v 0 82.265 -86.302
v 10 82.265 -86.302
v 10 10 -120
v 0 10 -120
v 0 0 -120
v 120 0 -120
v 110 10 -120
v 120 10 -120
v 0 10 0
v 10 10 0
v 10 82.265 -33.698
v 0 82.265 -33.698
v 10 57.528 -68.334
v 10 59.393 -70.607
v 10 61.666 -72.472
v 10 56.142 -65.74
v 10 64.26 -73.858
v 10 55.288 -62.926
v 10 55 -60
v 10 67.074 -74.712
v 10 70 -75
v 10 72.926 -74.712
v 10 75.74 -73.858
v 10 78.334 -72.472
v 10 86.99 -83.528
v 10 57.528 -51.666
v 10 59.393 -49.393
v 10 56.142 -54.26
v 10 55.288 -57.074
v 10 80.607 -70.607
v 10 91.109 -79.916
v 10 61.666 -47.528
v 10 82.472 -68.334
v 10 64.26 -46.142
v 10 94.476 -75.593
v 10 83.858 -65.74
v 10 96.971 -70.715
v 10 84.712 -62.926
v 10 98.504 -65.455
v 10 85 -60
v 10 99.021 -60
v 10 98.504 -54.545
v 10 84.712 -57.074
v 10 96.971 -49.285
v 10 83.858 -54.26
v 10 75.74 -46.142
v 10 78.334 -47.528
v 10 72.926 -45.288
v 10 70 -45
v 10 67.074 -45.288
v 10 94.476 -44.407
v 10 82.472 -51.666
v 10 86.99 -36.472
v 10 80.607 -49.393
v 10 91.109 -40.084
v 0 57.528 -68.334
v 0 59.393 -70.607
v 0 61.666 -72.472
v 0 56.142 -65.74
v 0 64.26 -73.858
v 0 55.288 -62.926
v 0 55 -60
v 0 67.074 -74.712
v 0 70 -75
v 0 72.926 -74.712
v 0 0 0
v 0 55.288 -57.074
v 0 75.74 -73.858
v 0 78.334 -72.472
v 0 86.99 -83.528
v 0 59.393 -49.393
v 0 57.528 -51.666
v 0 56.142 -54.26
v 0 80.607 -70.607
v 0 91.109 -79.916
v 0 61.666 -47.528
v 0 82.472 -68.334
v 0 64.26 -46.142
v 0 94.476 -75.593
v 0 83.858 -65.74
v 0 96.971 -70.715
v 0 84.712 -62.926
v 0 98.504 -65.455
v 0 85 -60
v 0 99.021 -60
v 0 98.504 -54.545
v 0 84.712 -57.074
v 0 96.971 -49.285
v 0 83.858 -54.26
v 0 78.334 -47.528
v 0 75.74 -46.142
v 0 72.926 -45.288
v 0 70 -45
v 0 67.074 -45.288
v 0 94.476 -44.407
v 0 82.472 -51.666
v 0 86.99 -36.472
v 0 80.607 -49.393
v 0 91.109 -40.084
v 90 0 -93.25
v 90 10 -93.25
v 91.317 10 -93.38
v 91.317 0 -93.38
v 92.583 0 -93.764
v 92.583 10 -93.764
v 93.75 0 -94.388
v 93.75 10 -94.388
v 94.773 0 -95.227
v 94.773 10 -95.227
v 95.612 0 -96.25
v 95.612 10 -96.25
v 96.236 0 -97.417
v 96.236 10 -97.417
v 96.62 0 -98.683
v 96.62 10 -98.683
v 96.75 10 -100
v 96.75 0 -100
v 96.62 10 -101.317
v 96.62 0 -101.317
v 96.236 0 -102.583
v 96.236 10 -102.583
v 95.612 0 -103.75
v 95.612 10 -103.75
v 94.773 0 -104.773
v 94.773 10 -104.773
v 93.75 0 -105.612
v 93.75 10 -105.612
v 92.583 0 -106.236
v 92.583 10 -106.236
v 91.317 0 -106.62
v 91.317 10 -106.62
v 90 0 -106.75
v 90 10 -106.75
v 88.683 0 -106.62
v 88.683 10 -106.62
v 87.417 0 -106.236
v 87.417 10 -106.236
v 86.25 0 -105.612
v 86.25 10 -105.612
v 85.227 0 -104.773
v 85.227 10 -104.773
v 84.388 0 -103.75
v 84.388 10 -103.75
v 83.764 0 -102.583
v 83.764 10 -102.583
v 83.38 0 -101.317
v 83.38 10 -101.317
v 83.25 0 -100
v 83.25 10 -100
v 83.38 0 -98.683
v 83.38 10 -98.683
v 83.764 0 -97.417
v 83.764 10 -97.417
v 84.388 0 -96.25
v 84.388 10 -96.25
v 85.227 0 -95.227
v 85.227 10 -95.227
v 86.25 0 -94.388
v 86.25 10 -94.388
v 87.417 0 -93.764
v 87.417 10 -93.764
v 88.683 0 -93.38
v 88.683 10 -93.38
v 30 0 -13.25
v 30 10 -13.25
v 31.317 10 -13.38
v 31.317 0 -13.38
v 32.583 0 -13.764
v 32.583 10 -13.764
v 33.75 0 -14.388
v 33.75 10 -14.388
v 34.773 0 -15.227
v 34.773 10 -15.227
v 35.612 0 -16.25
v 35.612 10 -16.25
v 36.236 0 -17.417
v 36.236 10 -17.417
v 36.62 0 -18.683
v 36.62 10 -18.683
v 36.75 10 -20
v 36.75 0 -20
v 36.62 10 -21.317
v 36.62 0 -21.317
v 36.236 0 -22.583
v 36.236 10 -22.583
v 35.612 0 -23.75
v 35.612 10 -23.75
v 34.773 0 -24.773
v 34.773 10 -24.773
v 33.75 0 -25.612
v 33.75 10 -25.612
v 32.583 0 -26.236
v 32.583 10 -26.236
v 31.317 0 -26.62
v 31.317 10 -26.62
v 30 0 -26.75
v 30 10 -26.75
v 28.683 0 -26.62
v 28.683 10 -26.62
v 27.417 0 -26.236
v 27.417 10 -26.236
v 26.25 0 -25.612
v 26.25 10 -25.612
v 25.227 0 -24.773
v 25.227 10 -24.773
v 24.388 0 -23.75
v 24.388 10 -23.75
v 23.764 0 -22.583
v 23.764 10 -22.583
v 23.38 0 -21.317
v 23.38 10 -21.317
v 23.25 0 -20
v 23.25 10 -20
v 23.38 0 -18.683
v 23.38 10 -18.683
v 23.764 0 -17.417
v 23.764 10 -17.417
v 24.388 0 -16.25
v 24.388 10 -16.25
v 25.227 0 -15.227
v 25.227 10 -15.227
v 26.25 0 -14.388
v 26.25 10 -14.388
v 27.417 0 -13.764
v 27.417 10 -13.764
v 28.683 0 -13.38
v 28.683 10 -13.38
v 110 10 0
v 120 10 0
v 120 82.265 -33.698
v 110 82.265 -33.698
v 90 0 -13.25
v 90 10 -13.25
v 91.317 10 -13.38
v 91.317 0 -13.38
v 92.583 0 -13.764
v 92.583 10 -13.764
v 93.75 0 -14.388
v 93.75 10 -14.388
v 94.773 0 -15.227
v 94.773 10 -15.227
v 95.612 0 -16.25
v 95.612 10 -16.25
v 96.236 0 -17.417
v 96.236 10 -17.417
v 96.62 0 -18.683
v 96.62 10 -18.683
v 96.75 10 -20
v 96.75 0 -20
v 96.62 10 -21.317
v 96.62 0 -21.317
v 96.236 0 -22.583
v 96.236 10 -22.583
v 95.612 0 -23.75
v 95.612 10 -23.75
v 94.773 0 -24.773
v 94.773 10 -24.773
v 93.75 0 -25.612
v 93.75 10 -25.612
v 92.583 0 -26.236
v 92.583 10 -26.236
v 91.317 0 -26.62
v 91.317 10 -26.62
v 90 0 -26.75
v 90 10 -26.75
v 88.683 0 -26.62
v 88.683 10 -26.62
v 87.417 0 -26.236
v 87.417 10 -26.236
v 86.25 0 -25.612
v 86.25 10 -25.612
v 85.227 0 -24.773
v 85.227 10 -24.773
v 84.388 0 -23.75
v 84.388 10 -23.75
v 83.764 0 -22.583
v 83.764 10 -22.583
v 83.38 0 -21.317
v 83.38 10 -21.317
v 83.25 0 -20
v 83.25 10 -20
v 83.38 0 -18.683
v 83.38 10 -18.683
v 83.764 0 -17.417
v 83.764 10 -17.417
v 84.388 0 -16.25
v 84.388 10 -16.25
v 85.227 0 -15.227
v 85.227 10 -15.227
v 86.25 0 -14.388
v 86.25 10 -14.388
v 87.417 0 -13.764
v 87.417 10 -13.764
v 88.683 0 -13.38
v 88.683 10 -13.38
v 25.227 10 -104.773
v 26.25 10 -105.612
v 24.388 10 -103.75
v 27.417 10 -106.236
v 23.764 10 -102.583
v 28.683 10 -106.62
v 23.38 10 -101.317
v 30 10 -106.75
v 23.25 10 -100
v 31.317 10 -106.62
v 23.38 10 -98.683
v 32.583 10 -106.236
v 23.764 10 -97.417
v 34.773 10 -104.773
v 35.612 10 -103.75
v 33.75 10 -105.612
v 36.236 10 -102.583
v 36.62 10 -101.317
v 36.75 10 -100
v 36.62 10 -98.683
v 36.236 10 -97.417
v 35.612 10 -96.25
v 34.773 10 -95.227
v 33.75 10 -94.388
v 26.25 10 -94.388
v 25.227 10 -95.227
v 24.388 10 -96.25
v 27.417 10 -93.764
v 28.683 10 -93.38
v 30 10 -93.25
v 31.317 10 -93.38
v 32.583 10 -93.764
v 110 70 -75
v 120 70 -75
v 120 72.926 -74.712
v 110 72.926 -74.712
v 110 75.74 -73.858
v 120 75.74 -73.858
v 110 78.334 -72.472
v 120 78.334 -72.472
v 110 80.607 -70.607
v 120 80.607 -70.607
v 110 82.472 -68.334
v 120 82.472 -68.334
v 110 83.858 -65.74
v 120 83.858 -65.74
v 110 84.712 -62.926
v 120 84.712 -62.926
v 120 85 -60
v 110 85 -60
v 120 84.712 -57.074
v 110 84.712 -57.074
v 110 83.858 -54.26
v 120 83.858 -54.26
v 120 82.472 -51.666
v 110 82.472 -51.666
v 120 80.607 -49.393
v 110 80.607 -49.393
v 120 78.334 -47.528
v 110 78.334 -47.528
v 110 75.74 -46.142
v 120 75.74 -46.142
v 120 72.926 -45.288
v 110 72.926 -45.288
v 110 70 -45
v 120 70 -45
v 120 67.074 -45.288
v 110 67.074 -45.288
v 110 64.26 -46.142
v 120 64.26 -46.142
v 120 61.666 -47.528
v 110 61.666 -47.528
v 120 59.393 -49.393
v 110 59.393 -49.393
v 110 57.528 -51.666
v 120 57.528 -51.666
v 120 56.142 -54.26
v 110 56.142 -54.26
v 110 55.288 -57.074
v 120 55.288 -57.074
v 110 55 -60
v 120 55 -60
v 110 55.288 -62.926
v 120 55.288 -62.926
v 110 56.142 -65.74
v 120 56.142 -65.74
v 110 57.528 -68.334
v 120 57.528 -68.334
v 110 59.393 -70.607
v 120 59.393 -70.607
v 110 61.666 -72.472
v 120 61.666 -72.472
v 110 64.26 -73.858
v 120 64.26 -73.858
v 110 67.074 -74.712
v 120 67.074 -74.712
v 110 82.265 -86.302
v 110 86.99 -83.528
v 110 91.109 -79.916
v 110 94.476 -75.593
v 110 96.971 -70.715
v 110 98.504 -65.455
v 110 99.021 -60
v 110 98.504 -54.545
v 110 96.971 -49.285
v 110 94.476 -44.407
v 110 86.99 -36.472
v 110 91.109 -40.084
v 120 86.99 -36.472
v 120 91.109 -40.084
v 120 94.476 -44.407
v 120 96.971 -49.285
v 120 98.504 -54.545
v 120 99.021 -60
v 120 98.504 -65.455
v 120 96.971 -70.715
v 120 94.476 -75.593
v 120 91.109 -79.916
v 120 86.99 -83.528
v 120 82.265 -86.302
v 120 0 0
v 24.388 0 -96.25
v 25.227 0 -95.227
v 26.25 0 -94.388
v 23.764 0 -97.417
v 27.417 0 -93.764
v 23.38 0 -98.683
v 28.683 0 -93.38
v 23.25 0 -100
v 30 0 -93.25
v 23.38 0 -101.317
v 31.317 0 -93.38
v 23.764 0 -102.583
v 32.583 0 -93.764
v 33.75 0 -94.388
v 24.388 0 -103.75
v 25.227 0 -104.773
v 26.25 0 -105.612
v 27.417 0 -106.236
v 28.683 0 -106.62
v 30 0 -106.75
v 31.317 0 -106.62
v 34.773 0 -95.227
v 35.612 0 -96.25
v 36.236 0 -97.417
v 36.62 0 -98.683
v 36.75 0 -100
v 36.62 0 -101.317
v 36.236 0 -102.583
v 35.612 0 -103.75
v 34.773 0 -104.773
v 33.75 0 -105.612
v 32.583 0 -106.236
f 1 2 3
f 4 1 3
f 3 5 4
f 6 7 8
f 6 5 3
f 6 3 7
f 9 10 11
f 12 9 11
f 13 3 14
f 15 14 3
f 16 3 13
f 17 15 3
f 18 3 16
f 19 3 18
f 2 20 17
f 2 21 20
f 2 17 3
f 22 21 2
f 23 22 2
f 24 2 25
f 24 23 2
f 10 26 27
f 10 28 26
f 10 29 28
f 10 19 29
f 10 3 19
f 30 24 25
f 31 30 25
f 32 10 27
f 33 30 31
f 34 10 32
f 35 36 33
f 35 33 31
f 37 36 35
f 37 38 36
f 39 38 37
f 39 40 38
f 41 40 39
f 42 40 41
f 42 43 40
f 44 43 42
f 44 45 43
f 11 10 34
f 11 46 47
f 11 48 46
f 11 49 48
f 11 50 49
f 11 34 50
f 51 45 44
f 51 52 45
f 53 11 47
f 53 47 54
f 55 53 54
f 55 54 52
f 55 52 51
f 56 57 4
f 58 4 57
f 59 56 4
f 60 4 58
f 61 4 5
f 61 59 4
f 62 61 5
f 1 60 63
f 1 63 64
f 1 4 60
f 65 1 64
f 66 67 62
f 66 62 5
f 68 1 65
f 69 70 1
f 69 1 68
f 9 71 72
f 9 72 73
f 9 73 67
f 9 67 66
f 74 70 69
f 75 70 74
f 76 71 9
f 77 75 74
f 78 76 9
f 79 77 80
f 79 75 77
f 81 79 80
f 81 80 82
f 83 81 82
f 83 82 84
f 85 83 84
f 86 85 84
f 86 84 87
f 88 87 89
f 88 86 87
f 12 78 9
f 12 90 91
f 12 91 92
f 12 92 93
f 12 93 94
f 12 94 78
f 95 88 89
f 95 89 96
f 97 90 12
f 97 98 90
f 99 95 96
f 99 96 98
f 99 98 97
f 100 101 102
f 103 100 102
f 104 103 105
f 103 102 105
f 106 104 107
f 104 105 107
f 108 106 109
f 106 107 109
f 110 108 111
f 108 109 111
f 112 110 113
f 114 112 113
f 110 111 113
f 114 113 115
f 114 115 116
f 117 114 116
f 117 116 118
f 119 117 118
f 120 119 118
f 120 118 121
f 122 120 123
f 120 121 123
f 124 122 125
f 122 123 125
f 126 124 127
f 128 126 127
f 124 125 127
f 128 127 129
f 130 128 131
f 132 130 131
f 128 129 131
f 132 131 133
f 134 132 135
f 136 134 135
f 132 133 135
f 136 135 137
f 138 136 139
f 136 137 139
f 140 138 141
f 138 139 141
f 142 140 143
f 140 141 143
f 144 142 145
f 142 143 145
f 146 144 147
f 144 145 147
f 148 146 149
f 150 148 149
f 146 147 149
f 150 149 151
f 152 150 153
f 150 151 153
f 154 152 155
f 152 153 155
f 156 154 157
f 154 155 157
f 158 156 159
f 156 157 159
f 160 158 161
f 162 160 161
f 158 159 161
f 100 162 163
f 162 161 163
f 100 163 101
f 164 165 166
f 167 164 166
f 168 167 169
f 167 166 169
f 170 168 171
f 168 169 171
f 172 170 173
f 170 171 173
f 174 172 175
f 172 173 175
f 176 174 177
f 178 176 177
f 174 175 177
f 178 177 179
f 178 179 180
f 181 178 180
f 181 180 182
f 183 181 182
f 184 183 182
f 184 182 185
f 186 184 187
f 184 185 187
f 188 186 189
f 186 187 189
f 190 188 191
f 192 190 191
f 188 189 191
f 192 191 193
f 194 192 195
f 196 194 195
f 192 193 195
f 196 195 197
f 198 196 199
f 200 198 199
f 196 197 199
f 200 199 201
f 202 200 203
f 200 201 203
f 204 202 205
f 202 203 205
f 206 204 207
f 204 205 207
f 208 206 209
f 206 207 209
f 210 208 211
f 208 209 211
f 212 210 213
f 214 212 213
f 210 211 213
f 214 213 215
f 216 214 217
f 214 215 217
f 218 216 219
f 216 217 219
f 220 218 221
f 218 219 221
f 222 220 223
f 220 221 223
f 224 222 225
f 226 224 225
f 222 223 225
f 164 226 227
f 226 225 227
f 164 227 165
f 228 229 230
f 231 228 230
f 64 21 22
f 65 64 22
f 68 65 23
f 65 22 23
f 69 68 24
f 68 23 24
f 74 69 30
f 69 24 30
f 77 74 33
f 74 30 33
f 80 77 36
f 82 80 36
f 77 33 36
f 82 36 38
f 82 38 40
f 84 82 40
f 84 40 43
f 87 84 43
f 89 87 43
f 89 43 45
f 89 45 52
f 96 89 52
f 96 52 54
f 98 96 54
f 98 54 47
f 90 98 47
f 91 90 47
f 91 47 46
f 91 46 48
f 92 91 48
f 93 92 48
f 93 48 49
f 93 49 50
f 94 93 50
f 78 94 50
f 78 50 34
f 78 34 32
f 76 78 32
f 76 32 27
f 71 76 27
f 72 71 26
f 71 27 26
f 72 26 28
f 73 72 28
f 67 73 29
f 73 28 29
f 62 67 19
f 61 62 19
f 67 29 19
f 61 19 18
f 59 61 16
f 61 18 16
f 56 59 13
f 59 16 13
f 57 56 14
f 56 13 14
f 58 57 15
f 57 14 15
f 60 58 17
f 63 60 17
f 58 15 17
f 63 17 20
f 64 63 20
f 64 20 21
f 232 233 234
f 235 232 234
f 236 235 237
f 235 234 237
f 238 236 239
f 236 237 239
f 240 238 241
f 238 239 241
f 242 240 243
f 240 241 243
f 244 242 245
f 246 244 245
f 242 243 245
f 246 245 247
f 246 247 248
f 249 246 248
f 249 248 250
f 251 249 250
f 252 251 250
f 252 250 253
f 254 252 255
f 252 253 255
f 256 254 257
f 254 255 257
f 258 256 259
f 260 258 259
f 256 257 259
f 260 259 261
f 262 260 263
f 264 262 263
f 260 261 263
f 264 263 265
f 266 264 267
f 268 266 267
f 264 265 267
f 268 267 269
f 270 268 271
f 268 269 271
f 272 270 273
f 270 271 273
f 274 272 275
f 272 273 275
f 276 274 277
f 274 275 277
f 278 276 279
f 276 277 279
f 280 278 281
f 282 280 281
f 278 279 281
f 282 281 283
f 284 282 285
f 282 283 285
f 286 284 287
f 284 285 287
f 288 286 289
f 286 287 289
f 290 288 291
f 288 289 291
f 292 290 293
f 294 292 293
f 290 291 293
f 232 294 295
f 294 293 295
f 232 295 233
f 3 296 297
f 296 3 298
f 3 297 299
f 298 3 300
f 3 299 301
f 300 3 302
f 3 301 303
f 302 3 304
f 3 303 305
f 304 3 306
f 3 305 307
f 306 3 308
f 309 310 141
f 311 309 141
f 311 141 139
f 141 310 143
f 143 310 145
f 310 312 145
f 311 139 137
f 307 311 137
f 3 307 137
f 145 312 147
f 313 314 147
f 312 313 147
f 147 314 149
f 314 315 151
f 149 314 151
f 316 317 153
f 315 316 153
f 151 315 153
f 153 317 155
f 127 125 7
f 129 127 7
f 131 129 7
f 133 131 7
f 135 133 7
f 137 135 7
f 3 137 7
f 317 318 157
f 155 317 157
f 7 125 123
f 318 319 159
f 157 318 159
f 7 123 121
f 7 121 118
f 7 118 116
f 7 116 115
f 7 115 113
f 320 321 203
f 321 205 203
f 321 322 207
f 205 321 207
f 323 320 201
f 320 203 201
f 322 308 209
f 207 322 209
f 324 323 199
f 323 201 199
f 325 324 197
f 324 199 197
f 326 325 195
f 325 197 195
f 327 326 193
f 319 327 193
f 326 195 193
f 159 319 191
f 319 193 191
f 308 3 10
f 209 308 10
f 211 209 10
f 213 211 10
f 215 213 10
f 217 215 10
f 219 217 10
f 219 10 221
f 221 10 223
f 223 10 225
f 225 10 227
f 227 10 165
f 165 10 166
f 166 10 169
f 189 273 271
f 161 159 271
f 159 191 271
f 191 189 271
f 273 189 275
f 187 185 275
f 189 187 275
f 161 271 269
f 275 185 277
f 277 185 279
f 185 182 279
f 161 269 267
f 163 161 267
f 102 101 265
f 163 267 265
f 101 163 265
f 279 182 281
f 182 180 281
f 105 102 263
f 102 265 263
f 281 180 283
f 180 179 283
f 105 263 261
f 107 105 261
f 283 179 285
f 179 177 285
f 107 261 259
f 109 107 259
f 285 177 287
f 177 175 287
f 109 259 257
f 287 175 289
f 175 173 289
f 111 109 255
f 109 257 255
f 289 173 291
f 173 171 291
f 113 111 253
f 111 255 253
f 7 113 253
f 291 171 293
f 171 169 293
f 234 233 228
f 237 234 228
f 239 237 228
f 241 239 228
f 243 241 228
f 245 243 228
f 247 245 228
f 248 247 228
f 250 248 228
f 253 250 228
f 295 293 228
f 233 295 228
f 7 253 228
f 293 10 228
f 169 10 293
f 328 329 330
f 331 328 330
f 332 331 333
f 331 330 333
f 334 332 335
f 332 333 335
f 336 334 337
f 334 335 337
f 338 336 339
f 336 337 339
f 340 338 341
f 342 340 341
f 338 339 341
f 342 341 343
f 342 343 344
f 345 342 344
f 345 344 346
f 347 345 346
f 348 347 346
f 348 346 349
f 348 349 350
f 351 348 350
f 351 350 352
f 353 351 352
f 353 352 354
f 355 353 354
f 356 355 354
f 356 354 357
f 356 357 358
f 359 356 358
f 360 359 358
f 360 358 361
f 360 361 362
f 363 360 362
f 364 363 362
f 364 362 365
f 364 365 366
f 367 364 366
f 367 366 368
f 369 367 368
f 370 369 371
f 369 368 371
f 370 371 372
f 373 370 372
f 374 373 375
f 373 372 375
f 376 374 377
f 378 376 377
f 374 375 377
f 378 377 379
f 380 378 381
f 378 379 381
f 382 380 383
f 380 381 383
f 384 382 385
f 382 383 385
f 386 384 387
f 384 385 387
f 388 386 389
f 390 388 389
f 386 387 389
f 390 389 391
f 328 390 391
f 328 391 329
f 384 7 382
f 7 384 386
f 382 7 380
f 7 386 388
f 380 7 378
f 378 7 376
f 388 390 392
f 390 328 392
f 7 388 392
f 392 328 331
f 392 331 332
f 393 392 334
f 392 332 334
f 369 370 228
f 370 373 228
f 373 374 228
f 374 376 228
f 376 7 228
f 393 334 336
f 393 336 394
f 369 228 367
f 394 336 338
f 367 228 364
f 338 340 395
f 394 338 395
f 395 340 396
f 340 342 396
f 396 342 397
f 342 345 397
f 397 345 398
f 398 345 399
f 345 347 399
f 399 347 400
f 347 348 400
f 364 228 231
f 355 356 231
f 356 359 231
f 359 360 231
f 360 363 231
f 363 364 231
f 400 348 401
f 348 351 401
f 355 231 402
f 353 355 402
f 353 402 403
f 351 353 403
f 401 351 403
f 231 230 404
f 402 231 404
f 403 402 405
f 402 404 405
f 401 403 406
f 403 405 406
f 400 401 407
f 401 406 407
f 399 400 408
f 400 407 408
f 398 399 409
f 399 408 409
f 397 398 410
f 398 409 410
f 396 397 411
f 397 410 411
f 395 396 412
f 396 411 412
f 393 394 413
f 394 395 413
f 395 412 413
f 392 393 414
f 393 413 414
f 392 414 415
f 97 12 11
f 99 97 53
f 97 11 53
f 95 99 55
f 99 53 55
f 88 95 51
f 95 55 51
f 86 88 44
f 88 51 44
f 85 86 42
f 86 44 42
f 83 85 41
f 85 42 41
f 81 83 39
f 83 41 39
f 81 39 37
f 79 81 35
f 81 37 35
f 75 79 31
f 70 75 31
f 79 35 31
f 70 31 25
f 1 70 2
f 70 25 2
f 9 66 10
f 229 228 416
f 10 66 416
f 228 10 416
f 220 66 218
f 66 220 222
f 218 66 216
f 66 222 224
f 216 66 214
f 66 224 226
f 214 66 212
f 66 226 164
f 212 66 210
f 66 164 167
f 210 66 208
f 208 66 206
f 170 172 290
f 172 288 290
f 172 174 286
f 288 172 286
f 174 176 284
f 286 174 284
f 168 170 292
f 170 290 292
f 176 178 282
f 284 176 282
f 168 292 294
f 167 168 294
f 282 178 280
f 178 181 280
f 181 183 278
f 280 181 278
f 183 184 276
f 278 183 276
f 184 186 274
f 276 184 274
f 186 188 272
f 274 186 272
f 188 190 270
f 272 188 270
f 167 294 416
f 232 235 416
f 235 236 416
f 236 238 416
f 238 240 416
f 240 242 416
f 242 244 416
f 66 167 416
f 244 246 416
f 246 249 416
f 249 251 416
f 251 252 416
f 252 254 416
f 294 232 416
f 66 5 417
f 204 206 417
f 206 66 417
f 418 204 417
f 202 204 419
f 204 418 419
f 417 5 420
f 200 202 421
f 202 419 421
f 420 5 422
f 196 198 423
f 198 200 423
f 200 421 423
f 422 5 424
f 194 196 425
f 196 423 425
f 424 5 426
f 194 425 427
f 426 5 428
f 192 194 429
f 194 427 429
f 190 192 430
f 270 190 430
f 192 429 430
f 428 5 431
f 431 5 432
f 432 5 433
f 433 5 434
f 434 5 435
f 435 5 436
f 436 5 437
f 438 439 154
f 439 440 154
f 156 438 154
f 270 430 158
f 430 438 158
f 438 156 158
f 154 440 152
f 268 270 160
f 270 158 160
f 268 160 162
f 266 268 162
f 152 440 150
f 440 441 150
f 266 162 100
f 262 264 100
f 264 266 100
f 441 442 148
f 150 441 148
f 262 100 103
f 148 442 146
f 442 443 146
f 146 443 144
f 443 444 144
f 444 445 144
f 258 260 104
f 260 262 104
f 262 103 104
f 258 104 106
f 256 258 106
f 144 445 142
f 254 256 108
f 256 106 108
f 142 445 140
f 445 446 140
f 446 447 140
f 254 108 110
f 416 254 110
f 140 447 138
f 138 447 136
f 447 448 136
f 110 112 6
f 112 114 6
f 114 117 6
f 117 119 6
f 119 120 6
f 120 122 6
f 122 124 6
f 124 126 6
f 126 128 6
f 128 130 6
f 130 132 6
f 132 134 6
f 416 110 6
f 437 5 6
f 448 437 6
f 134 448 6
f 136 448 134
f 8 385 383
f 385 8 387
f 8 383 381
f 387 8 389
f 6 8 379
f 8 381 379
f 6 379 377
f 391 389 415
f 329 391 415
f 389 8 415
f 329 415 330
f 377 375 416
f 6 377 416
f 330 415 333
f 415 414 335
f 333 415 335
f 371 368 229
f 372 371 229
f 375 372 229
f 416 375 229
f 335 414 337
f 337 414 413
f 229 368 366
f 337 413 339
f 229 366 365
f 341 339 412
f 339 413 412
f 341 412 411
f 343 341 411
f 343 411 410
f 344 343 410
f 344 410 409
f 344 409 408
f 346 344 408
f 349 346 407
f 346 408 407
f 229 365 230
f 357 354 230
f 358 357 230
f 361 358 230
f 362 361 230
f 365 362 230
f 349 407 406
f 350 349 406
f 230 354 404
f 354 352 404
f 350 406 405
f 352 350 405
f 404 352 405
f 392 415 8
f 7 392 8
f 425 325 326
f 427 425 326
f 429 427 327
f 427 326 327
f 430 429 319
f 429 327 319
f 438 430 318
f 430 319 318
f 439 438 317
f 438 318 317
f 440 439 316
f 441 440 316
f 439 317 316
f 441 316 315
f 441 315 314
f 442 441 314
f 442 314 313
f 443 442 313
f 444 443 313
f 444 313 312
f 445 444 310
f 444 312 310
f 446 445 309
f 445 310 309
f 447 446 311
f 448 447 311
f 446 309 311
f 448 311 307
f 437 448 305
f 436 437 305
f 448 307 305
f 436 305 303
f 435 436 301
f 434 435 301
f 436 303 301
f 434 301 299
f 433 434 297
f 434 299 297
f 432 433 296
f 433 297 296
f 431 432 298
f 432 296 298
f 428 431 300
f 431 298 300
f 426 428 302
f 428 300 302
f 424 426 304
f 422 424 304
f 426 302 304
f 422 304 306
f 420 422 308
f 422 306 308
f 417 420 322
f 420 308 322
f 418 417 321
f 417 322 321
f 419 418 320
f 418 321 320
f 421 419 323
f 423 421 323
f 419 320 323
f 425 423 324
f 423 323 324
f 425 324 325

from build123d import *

# Parameters (mm, degrees)
ESQUISSE1_W             = 120
ESQUISSE1_H             = 120
BOSS_EXTRU_2_DEPTH      = 10
ESQUISSE2_R             = 15
BOSS_EXTRU_3_DEPTH      = 120
ESQUISSE3_W             = 100
ESQUISSE3_H             = 122.401822982
ENL_V_MAT_EXTRU_1_DEPTH = 197.482141726
ESQUISSE4_R             = 6.75
ENL_V_MAT_EXTRU_2_DEPTH = 10


with BuildPart() as part:
    # Esquisse1 → Boss.-Extru.2 (new body)
    with BuildSketch(Plane(origin=(0, 0, 0), x_dir=(1, 0, 0), z_dir=(0, 1, 0))):
        with Locations((60, 60)):
            Rectangle(ESQUISSE1_W, ESQUISSE1_H)
    extrude(amount=BOSS_EXTRU_2_DEPTH)

    # Esquisse2 → Boss.-Extru.3 (add)
    with BuildSketch(Plane(origin=(120, 0, 0), x_dir=(0, 0, -1), z_dir=(1, 0, 0))):
        with BuildLine():
            Line((86.302294997, 82.264961584), (120, 10))
            Line((120, 10), (0, 10))
            Line((0, 10), (33.697705003, 82.264961584))
            ThreePointArc((33.697705003, 82.264961584), (60, 99.021371518), (86.302294997, 82.264961584))
        make_face()
        with Locations((60, 70)):
            Circle(ESQUISSE2_R, mode=Mode.SUBTRACT)
    extrude(amount=-BOSS_EXTRU_3_DEPTH)

    # Esquisse3 → Enlèv. mat.-Extru.1 (cut, through all)
    with BuildSketch(Plane.XY):
        with Locations((60, 71.200911491)):
            Rectangle(ESQUISSE3_W, ESQUISSE3_H)
    extrude(amount=-ENL_V_MAT_EXTRU_1_DEPTH, mode=Mode.SUBTRACT)

    # Esquisse4 → Enlèv. mat.-Extru.2 (cut)
    with BuildSketch(Plane(origin=(0, 10, 0), x_dir=(1, 0, 0), z_dir=(0, 1, 0))):
        with Locations(Location((30, 20, 0), (0, 0, 270))):
            Circle(ESQUISSE4_R)
        with Locations(Location((30, 100, 0), (0, 0, 270))):
            Circle(ESQUISSE4_R)
        with Locations(Location((90, 100, 0), (0, 0, 270))):
            Circle(ESQUISSE4_R)
        with Locations(Location((90, 20, 0), (0, 0, 270))):
            Circle(ESQUISSE4_R)
    extrude(amount=-ENL_V_MAT_EXTRU_2_DEPTH, mode=Mode.SUBTRACT)


solid = part.part
